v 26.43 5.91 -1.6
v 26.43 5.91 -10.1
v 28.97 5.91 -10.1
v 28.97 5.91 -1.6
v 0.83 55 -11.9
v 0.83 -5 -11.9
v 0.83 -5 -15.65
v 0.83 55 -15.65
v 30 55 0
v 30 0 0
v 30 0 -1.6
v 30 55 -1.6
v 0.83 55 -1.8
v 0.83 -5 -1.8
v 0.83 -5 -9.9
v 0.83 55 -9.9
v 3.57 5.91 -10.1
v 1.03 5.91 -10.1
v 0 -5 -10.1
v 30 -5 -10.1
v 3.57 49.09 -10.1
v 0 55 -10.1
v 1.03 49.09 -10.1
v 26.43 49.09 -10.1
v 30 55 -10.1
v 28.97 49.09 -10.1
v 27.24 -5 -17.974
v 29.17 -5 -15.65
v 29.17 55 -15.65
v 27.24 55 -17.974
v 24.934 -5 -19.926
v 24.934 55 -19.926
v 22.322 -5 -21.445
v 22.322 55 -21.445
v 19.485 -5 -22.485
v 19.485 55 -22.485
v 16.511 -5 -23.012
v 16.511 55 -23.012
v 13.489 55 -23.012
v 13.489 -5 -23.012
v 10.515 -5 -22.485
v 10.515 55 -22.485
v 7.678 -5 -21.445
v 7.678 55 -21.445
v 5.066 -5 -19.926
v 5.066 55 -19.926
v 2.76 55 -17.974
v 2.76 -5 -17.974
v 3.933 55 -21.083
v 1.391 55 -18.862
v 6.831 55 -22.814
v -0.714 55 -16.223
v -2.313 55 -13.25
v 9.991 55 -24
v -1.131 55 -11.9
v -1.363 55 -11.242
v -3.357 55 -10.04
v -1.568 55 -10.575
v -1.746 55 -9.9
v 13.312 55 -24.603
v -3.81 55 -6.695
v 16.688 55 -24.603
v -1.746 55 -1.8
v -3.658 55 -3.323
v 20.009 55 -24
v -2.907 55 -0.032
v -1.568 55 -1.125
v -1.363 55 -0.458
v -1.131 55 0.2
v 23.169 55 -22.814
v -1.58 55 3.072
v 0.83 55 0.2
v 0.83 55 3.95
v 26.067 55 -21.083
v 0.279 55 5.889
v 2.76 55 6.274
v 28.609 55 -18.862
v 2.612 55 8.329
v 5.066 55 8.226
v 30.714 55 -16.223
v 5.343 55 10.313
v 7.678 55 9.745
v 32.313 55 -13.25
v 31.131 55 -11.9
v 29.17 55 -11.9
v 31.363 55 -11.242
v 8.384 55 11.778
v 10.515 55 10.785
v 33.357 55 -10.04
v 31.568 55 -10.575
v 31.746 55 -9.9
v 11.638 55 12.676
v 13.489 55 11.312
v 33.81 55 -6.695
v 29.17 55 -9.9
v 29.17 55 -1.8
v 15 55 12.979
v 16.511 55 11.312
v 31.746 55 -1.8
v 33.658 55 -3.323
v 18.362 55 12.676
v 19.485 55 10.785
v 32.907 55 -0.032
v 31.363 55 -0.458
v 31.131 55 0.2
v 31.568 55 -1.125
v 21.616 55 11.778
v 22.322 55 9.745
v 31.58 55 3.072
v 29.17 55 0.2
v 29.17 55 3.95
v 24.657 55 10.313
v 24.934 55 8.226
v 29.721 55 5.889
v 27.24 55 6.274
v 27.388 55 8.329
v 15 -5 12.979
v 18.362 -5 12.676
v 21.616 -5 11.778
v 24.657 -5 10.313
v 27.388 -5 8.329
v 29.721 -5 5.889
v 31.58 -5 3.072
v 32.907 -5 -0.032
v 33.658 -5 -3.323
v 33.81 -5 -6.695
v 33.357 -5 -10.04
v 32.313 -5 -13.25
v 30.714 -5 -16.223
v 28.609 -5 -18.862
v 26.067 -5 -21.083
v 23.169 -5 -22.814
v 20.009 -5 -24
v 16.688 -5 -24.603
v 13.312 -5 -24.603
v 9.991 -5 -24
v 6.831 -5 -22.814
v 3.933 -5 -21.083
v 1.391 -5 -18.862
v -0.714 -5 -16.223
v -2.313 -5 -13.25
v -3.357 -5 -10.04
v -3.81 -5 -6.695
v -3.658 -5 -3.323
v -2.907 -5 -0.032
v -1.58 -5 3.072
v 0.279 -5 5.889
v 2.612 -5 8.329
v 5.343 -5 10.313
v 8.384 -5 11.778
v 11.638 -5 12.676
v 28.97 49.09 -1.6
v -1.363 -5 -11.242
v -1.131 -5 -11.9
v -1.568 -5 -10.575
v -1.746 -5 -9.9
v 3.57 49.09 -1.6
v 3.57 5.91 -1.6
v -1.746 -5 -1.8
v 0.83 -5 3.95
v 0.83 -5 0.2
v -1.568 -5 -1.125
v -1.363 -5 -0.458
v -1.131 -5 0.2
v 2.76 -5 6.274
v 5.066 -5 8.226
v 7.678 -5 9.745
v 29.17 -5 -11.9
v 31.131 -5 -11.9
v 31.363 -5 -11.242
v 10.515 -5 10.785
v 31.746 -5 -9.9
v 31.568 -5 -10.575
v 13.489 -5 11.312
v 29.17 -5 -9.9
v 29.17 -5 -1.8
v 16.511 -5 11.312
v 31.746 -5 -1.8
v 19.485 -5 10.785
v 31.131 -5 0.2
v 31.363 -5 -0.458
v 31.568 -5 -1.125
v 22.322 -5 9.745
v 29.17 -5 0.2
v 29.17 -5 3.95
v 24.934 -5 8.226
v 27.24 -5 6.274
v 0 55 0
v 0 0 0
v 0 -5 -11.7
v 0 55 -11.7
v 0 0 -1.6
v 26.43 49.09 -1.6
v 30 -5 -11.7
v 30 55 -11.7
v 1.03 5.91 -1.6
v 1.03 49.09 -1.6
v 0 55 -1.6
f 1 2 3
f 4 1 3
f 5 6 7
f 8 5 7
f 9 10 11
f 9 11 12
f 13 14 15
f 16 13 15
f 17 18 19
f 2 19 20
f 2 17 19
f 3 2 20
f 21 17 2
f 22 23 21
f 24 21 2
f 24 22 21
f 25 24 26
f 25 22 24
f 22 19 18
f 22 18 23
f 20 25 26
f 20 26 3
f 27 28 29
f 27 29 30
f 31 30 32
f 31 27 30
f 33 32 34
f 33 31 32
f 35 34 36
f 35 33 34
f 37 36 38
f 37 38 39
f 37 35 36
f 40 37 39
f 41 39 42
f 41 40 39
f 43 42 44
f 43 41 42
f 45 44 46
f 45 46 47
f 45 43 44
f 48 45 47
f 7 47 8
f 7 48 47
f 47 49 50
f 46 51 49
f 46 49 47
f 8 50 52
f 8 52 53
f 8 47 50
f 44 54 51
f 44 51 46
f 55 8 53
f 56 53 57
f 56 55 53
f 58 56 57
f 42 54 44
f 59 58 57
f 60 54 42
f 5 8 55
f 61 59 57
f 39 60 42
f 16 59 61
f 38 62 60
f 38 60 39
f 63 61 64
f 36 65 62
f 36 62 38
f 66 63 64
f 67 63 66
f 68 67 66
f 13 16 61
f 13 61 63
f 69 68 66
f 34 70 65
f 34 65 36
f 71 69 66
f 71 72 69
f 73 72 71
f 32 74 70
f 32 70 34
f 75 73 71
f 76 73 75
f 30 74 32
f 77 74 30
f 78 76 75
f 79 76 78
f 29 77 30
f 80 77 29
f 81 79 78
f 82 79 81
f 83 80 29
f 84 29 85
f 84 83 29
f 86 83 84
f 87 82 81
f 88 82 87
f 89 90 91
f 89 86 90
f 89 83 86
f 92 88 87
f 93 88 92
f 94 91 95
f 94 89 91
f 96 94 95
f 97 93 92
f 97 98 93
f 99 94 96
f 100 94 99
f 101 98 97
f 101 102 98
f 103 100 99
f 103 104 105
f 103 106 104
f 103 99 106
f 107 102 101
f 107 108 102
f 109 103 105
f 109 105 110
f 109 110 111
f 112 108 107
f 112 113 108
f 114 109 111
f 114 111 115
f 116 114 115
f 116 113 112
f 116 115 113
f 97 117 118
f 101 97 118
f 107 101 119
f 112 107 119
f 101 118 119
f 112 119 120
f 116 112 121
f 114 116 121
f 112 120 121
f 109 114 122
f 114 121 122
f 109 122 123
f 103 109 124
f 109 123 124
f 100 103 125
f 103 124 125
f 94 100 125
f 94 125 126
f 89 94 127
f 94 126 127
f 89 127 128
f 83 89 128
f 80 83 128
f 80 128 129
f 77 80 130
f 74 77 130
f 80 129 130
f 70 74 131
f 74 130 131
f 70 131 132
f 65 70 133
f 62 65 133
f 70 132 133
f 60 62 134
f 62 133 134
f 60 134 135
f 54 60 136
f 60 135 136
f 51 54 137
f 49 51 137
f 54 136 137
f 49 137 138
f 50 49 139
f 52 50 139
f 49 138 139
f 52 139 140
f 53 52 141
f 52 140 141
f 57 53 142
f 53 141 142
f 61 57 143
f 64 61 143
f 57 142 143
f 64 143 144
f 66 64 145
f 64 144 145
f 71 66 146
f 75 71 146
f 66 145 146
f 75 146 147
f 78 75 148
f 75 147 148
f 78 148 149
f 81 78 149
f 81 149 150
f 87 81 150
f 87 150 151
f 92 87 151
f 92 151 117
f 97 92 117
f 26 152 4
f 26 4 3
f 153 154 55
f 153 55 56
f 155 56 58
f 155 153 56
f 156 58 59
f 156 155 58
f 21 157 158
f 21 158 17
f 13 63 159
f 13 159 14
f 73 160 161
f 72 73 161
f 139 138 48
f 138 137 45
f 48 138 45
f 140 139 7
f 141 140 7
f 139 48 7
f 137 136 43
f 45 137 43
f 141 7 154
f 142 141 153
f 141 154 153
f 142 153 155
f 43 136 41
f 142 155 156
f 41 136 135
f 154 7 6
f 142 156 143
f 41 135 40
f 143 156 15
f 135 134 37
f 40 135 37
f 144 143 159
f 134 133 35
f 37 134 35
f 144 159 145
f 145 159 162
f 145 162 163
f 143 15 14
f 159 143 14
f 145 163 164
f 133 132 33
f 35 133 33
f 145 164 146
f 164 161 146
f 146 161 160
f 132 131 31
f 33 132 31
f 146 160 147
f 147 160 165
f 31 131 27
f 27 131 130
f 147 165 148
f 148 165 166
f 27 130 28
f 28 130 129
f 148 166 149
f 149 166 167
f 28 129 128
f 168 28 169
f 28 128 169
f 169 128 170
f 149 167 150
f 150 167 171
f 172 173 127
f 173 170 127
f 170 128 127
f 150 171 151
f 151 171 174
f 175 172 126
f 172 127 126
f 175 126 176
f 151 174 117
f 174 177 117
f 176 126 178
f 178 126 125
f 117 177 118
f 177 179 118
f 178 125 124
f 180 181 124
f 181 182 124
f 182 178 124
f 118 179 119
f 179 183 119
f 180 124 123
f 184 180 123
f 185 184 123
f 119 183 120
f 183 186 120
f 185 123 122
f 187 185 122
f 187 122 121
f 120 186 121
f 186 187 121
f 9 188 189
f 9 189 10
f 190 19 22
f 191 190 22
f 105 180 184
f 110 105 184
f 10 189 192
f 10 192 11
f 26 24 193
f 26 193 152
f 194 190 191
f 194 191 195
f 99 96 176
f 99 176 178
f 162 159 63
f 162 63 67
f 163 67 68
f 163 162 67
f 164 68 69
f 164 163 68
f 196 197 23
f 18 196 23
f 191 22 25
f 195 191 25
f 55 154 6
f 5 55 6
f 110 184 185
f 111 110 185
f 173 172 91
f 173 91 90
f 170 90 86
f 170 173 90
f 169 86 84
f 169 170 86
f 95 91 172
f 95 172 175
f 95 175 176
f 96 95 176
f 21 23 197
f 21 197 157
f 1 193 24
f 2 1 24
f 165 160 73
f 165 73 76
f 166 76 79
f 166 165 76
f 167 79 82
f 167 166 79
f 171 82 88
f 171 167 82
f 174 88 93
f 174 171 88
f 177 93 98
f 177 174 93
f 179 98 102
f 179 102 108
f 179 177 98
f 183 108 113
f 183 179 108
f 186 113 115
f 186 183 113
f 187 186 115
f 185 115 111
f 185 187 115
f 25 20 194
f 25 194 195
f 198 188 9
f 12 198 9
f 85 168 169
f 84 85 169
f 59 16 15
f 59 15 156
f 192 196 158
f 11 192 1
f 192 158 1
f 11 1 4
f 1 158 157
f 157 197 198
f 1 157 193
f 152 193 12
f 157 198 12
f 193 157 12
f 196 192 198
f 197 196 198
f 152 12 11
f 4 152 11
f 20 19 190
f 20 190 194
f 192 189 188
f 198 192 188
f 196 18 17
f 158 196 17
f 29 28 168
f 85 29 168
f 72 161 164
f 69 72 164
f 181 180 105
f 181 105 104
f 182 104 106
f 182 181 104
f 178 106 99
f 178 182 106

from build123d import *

# Parameters (mm, degrees)
OBC_2_W             = 30
OBC_2_H             = 55
OBC_DEPTH           = 1.6
HEADERS_START       = 5.91
HEADERS_OUTLINE_W   = 2.54
HEADERS_OUTLINE_H   = 8.5
HEADERS_DEPTH       = 43.18
RF_START            = -10.1
RF_2_W              = 30
RF_2_H              = 60
RF_DEPTH            = 1.6
BOSS_EXTRUDE4_START = -5
ENCLOSURE_R         = 18.828638124
ENCLOSURE_R_2       = 17.228638124
BOSS_EXTRUDE4_DEPTH = 60


# Read off the part's stored shape, not the designer's step: Headers
with BuildPart() as part:
    # OBC 2 → OBC (new body)
    with BuildSketch(Plane.XY):
        with Locations((15, 27.5)):
            Rectangle(OBC_2_W, OBC_2_H)
    extrude(amount=-OBC_DEPTH)

    # Headers outline → Headers (add)
    with BuildSketch(Plane(origin=(0, 0, 0), x_dir=(1, 0, 0), z_dir=(0, 1, 0)).offset(HEADERS_START)):
        with Locations((27.7, 5.85)):
            Rectangle(HEADERS_OUTLINE_W, HEADERS_OUTLINE_H)
        with Locations((2.3, 5.85)):
            Rectangle(HEADERS_OUTLINE_W, HEADERS_OUTLINE_H)
    extrude(amount=HEADERS_DEPTH)

    # RF 2 → RF (add)
    with BuildSketch(Plane.XY.offset(RF_START)):
        with Locations((15, 25)):
            Rectangle(RF_2_W, RF_2_H)
    extrude(amount=-RF_DEPTH)


with BuildPart() as body_2:
    # Enclosure → Boss-Extrude4 (new body)
    # profile 1 of 7: a face of its own
    with BuildSketch(Plane(origin=(0, 0, 0), x_dir=(1, 0, 0), z_dir=(0, 1, 0)).offset(BOSS_EXTRUDE4_START)):
        with Locations(Location((15, 5.85, 0), (0, 0, 270))):
            Circle(ENCLOSURE_R)
        with Locations((15, 5.85)):
            Circle(ENCLOSURE_R_2, mode=Mode.SUBTRACT)
    # profile 2 of 7: a face of its own
    with BuildSketch(Plane(origin=(0, 0, 0), x_dir=(1, 0, 0), z_dir=(0, 1, 0)).offset(BOSS_EXTRUDE4_START)):
        with BuildLine():
            ThreePointArc((0.83, 15.649850591), (-0.266293442, 13.835377647), (-1.131443569, 11.9))
            Line((-1.131443569, 11.9), (0.83, 11.9))
            Line((0.83, 11.9), (0.83, 15.649850591))
        make_face()
    # profile 3 of 7: a face of its own
    with BuildSketch(Plane(origin=(0, 0, 0), x_dir=(1, 0, 0), z_dir=(0, 1, 0)).offset(BOSS_EXTRUDE4_START)):
        with BuildLine():
            Line((0.83, 9.9), (-1.745849385, 9.9))
            ThreePointArc((-1.745849385, 9.9), (-2.228638124, 5.85), (-1.745849385, 1.8))
            Line((-1.745849385, 1.8), (0.83, 1.8))
            Line((0.83, 1.8), (0.83, 9.9))
        make_face()
    # profile 4 of 7: a face of its own
    with BuildSketch(Plane(origin=(0, 0, 0), x_dir=(1, 0, 0), z_dir=(0, 1, 0)).offset(BOSS_EXTRUDE4_START)):
        with BuildLine():
            Line((0.83, -0.2), (-1.131443569, -0.2))
            ThreePointArc((-1.131443569, -0.2), (-0.266293442, -2.135377647), (0.83, -3.949850591))
            Line((0.83, -3.949850591), (0.83, -0.2))
        make_face()
    # profile 5 of 7: a face of its own
    with BuildSketch(Plane(origin=(0, 0, 0), x_dir=(1, 0, 0), z_dir=(0, 1, 0)).offset(BOSS_EXTRUDE4_START)):
        with BuildLine():
            Line((29.17, -0.2), (29.17, -3.949850591))
            ThreePointArc((29.17, -3.949850591), (30.266293442, -2.135377647), (31.131443569, -0.2))
            Line((31.131443569, -0.2), (29.17, -0.2))
        make_face()
    # profile 6 of 7: a face of its own
    with BuildSketch(Plane(origin=(0, 0, 0), x_dir=(1, 0, 0), z_dir=(0, 1, 0)).offset(BOSS_EXTRUDE4_START)):
        with BuildLine():
            ThreePointArc((32.228638124, 5.85), (32.107515172, 7.889337206), (31.745849385, 9.9))
            Line((31.745849385, 9.9), (29.17, 9.9))
            Line((29.17, 9.9), (29.17, 1.8))
            Line((29.17, 1.8), (31.745849385, 1.8))
            ThreePointArc((31.745849385, 1.8), (32.107515172, 3.810662794), (32.228638124, 5.85))
        make_face()
    # profile 7 of 7: a face of its own
    with BuildSketch(Plane(origin=(0, 0, 0), x_dir=(1, 0, 0), z_dir=(0, 1, 0)).offset(BOSS_EXTRUDE4_START)):
        with BuildLine():
            ThreePointArc((31.131443569, 11.9), (30.266293442, 13.835377647), (29.17, 15.649850591))
            Line((29.17, 15.649850591), (29.17, 11.9))
            Line((29.17, 11.9), (31.131443569, 11.9))
        make_face()
    extrude(amount=BOSS_EXTRUDE4_DEPTH)


solid = Compound([part.part, body_2.part])
